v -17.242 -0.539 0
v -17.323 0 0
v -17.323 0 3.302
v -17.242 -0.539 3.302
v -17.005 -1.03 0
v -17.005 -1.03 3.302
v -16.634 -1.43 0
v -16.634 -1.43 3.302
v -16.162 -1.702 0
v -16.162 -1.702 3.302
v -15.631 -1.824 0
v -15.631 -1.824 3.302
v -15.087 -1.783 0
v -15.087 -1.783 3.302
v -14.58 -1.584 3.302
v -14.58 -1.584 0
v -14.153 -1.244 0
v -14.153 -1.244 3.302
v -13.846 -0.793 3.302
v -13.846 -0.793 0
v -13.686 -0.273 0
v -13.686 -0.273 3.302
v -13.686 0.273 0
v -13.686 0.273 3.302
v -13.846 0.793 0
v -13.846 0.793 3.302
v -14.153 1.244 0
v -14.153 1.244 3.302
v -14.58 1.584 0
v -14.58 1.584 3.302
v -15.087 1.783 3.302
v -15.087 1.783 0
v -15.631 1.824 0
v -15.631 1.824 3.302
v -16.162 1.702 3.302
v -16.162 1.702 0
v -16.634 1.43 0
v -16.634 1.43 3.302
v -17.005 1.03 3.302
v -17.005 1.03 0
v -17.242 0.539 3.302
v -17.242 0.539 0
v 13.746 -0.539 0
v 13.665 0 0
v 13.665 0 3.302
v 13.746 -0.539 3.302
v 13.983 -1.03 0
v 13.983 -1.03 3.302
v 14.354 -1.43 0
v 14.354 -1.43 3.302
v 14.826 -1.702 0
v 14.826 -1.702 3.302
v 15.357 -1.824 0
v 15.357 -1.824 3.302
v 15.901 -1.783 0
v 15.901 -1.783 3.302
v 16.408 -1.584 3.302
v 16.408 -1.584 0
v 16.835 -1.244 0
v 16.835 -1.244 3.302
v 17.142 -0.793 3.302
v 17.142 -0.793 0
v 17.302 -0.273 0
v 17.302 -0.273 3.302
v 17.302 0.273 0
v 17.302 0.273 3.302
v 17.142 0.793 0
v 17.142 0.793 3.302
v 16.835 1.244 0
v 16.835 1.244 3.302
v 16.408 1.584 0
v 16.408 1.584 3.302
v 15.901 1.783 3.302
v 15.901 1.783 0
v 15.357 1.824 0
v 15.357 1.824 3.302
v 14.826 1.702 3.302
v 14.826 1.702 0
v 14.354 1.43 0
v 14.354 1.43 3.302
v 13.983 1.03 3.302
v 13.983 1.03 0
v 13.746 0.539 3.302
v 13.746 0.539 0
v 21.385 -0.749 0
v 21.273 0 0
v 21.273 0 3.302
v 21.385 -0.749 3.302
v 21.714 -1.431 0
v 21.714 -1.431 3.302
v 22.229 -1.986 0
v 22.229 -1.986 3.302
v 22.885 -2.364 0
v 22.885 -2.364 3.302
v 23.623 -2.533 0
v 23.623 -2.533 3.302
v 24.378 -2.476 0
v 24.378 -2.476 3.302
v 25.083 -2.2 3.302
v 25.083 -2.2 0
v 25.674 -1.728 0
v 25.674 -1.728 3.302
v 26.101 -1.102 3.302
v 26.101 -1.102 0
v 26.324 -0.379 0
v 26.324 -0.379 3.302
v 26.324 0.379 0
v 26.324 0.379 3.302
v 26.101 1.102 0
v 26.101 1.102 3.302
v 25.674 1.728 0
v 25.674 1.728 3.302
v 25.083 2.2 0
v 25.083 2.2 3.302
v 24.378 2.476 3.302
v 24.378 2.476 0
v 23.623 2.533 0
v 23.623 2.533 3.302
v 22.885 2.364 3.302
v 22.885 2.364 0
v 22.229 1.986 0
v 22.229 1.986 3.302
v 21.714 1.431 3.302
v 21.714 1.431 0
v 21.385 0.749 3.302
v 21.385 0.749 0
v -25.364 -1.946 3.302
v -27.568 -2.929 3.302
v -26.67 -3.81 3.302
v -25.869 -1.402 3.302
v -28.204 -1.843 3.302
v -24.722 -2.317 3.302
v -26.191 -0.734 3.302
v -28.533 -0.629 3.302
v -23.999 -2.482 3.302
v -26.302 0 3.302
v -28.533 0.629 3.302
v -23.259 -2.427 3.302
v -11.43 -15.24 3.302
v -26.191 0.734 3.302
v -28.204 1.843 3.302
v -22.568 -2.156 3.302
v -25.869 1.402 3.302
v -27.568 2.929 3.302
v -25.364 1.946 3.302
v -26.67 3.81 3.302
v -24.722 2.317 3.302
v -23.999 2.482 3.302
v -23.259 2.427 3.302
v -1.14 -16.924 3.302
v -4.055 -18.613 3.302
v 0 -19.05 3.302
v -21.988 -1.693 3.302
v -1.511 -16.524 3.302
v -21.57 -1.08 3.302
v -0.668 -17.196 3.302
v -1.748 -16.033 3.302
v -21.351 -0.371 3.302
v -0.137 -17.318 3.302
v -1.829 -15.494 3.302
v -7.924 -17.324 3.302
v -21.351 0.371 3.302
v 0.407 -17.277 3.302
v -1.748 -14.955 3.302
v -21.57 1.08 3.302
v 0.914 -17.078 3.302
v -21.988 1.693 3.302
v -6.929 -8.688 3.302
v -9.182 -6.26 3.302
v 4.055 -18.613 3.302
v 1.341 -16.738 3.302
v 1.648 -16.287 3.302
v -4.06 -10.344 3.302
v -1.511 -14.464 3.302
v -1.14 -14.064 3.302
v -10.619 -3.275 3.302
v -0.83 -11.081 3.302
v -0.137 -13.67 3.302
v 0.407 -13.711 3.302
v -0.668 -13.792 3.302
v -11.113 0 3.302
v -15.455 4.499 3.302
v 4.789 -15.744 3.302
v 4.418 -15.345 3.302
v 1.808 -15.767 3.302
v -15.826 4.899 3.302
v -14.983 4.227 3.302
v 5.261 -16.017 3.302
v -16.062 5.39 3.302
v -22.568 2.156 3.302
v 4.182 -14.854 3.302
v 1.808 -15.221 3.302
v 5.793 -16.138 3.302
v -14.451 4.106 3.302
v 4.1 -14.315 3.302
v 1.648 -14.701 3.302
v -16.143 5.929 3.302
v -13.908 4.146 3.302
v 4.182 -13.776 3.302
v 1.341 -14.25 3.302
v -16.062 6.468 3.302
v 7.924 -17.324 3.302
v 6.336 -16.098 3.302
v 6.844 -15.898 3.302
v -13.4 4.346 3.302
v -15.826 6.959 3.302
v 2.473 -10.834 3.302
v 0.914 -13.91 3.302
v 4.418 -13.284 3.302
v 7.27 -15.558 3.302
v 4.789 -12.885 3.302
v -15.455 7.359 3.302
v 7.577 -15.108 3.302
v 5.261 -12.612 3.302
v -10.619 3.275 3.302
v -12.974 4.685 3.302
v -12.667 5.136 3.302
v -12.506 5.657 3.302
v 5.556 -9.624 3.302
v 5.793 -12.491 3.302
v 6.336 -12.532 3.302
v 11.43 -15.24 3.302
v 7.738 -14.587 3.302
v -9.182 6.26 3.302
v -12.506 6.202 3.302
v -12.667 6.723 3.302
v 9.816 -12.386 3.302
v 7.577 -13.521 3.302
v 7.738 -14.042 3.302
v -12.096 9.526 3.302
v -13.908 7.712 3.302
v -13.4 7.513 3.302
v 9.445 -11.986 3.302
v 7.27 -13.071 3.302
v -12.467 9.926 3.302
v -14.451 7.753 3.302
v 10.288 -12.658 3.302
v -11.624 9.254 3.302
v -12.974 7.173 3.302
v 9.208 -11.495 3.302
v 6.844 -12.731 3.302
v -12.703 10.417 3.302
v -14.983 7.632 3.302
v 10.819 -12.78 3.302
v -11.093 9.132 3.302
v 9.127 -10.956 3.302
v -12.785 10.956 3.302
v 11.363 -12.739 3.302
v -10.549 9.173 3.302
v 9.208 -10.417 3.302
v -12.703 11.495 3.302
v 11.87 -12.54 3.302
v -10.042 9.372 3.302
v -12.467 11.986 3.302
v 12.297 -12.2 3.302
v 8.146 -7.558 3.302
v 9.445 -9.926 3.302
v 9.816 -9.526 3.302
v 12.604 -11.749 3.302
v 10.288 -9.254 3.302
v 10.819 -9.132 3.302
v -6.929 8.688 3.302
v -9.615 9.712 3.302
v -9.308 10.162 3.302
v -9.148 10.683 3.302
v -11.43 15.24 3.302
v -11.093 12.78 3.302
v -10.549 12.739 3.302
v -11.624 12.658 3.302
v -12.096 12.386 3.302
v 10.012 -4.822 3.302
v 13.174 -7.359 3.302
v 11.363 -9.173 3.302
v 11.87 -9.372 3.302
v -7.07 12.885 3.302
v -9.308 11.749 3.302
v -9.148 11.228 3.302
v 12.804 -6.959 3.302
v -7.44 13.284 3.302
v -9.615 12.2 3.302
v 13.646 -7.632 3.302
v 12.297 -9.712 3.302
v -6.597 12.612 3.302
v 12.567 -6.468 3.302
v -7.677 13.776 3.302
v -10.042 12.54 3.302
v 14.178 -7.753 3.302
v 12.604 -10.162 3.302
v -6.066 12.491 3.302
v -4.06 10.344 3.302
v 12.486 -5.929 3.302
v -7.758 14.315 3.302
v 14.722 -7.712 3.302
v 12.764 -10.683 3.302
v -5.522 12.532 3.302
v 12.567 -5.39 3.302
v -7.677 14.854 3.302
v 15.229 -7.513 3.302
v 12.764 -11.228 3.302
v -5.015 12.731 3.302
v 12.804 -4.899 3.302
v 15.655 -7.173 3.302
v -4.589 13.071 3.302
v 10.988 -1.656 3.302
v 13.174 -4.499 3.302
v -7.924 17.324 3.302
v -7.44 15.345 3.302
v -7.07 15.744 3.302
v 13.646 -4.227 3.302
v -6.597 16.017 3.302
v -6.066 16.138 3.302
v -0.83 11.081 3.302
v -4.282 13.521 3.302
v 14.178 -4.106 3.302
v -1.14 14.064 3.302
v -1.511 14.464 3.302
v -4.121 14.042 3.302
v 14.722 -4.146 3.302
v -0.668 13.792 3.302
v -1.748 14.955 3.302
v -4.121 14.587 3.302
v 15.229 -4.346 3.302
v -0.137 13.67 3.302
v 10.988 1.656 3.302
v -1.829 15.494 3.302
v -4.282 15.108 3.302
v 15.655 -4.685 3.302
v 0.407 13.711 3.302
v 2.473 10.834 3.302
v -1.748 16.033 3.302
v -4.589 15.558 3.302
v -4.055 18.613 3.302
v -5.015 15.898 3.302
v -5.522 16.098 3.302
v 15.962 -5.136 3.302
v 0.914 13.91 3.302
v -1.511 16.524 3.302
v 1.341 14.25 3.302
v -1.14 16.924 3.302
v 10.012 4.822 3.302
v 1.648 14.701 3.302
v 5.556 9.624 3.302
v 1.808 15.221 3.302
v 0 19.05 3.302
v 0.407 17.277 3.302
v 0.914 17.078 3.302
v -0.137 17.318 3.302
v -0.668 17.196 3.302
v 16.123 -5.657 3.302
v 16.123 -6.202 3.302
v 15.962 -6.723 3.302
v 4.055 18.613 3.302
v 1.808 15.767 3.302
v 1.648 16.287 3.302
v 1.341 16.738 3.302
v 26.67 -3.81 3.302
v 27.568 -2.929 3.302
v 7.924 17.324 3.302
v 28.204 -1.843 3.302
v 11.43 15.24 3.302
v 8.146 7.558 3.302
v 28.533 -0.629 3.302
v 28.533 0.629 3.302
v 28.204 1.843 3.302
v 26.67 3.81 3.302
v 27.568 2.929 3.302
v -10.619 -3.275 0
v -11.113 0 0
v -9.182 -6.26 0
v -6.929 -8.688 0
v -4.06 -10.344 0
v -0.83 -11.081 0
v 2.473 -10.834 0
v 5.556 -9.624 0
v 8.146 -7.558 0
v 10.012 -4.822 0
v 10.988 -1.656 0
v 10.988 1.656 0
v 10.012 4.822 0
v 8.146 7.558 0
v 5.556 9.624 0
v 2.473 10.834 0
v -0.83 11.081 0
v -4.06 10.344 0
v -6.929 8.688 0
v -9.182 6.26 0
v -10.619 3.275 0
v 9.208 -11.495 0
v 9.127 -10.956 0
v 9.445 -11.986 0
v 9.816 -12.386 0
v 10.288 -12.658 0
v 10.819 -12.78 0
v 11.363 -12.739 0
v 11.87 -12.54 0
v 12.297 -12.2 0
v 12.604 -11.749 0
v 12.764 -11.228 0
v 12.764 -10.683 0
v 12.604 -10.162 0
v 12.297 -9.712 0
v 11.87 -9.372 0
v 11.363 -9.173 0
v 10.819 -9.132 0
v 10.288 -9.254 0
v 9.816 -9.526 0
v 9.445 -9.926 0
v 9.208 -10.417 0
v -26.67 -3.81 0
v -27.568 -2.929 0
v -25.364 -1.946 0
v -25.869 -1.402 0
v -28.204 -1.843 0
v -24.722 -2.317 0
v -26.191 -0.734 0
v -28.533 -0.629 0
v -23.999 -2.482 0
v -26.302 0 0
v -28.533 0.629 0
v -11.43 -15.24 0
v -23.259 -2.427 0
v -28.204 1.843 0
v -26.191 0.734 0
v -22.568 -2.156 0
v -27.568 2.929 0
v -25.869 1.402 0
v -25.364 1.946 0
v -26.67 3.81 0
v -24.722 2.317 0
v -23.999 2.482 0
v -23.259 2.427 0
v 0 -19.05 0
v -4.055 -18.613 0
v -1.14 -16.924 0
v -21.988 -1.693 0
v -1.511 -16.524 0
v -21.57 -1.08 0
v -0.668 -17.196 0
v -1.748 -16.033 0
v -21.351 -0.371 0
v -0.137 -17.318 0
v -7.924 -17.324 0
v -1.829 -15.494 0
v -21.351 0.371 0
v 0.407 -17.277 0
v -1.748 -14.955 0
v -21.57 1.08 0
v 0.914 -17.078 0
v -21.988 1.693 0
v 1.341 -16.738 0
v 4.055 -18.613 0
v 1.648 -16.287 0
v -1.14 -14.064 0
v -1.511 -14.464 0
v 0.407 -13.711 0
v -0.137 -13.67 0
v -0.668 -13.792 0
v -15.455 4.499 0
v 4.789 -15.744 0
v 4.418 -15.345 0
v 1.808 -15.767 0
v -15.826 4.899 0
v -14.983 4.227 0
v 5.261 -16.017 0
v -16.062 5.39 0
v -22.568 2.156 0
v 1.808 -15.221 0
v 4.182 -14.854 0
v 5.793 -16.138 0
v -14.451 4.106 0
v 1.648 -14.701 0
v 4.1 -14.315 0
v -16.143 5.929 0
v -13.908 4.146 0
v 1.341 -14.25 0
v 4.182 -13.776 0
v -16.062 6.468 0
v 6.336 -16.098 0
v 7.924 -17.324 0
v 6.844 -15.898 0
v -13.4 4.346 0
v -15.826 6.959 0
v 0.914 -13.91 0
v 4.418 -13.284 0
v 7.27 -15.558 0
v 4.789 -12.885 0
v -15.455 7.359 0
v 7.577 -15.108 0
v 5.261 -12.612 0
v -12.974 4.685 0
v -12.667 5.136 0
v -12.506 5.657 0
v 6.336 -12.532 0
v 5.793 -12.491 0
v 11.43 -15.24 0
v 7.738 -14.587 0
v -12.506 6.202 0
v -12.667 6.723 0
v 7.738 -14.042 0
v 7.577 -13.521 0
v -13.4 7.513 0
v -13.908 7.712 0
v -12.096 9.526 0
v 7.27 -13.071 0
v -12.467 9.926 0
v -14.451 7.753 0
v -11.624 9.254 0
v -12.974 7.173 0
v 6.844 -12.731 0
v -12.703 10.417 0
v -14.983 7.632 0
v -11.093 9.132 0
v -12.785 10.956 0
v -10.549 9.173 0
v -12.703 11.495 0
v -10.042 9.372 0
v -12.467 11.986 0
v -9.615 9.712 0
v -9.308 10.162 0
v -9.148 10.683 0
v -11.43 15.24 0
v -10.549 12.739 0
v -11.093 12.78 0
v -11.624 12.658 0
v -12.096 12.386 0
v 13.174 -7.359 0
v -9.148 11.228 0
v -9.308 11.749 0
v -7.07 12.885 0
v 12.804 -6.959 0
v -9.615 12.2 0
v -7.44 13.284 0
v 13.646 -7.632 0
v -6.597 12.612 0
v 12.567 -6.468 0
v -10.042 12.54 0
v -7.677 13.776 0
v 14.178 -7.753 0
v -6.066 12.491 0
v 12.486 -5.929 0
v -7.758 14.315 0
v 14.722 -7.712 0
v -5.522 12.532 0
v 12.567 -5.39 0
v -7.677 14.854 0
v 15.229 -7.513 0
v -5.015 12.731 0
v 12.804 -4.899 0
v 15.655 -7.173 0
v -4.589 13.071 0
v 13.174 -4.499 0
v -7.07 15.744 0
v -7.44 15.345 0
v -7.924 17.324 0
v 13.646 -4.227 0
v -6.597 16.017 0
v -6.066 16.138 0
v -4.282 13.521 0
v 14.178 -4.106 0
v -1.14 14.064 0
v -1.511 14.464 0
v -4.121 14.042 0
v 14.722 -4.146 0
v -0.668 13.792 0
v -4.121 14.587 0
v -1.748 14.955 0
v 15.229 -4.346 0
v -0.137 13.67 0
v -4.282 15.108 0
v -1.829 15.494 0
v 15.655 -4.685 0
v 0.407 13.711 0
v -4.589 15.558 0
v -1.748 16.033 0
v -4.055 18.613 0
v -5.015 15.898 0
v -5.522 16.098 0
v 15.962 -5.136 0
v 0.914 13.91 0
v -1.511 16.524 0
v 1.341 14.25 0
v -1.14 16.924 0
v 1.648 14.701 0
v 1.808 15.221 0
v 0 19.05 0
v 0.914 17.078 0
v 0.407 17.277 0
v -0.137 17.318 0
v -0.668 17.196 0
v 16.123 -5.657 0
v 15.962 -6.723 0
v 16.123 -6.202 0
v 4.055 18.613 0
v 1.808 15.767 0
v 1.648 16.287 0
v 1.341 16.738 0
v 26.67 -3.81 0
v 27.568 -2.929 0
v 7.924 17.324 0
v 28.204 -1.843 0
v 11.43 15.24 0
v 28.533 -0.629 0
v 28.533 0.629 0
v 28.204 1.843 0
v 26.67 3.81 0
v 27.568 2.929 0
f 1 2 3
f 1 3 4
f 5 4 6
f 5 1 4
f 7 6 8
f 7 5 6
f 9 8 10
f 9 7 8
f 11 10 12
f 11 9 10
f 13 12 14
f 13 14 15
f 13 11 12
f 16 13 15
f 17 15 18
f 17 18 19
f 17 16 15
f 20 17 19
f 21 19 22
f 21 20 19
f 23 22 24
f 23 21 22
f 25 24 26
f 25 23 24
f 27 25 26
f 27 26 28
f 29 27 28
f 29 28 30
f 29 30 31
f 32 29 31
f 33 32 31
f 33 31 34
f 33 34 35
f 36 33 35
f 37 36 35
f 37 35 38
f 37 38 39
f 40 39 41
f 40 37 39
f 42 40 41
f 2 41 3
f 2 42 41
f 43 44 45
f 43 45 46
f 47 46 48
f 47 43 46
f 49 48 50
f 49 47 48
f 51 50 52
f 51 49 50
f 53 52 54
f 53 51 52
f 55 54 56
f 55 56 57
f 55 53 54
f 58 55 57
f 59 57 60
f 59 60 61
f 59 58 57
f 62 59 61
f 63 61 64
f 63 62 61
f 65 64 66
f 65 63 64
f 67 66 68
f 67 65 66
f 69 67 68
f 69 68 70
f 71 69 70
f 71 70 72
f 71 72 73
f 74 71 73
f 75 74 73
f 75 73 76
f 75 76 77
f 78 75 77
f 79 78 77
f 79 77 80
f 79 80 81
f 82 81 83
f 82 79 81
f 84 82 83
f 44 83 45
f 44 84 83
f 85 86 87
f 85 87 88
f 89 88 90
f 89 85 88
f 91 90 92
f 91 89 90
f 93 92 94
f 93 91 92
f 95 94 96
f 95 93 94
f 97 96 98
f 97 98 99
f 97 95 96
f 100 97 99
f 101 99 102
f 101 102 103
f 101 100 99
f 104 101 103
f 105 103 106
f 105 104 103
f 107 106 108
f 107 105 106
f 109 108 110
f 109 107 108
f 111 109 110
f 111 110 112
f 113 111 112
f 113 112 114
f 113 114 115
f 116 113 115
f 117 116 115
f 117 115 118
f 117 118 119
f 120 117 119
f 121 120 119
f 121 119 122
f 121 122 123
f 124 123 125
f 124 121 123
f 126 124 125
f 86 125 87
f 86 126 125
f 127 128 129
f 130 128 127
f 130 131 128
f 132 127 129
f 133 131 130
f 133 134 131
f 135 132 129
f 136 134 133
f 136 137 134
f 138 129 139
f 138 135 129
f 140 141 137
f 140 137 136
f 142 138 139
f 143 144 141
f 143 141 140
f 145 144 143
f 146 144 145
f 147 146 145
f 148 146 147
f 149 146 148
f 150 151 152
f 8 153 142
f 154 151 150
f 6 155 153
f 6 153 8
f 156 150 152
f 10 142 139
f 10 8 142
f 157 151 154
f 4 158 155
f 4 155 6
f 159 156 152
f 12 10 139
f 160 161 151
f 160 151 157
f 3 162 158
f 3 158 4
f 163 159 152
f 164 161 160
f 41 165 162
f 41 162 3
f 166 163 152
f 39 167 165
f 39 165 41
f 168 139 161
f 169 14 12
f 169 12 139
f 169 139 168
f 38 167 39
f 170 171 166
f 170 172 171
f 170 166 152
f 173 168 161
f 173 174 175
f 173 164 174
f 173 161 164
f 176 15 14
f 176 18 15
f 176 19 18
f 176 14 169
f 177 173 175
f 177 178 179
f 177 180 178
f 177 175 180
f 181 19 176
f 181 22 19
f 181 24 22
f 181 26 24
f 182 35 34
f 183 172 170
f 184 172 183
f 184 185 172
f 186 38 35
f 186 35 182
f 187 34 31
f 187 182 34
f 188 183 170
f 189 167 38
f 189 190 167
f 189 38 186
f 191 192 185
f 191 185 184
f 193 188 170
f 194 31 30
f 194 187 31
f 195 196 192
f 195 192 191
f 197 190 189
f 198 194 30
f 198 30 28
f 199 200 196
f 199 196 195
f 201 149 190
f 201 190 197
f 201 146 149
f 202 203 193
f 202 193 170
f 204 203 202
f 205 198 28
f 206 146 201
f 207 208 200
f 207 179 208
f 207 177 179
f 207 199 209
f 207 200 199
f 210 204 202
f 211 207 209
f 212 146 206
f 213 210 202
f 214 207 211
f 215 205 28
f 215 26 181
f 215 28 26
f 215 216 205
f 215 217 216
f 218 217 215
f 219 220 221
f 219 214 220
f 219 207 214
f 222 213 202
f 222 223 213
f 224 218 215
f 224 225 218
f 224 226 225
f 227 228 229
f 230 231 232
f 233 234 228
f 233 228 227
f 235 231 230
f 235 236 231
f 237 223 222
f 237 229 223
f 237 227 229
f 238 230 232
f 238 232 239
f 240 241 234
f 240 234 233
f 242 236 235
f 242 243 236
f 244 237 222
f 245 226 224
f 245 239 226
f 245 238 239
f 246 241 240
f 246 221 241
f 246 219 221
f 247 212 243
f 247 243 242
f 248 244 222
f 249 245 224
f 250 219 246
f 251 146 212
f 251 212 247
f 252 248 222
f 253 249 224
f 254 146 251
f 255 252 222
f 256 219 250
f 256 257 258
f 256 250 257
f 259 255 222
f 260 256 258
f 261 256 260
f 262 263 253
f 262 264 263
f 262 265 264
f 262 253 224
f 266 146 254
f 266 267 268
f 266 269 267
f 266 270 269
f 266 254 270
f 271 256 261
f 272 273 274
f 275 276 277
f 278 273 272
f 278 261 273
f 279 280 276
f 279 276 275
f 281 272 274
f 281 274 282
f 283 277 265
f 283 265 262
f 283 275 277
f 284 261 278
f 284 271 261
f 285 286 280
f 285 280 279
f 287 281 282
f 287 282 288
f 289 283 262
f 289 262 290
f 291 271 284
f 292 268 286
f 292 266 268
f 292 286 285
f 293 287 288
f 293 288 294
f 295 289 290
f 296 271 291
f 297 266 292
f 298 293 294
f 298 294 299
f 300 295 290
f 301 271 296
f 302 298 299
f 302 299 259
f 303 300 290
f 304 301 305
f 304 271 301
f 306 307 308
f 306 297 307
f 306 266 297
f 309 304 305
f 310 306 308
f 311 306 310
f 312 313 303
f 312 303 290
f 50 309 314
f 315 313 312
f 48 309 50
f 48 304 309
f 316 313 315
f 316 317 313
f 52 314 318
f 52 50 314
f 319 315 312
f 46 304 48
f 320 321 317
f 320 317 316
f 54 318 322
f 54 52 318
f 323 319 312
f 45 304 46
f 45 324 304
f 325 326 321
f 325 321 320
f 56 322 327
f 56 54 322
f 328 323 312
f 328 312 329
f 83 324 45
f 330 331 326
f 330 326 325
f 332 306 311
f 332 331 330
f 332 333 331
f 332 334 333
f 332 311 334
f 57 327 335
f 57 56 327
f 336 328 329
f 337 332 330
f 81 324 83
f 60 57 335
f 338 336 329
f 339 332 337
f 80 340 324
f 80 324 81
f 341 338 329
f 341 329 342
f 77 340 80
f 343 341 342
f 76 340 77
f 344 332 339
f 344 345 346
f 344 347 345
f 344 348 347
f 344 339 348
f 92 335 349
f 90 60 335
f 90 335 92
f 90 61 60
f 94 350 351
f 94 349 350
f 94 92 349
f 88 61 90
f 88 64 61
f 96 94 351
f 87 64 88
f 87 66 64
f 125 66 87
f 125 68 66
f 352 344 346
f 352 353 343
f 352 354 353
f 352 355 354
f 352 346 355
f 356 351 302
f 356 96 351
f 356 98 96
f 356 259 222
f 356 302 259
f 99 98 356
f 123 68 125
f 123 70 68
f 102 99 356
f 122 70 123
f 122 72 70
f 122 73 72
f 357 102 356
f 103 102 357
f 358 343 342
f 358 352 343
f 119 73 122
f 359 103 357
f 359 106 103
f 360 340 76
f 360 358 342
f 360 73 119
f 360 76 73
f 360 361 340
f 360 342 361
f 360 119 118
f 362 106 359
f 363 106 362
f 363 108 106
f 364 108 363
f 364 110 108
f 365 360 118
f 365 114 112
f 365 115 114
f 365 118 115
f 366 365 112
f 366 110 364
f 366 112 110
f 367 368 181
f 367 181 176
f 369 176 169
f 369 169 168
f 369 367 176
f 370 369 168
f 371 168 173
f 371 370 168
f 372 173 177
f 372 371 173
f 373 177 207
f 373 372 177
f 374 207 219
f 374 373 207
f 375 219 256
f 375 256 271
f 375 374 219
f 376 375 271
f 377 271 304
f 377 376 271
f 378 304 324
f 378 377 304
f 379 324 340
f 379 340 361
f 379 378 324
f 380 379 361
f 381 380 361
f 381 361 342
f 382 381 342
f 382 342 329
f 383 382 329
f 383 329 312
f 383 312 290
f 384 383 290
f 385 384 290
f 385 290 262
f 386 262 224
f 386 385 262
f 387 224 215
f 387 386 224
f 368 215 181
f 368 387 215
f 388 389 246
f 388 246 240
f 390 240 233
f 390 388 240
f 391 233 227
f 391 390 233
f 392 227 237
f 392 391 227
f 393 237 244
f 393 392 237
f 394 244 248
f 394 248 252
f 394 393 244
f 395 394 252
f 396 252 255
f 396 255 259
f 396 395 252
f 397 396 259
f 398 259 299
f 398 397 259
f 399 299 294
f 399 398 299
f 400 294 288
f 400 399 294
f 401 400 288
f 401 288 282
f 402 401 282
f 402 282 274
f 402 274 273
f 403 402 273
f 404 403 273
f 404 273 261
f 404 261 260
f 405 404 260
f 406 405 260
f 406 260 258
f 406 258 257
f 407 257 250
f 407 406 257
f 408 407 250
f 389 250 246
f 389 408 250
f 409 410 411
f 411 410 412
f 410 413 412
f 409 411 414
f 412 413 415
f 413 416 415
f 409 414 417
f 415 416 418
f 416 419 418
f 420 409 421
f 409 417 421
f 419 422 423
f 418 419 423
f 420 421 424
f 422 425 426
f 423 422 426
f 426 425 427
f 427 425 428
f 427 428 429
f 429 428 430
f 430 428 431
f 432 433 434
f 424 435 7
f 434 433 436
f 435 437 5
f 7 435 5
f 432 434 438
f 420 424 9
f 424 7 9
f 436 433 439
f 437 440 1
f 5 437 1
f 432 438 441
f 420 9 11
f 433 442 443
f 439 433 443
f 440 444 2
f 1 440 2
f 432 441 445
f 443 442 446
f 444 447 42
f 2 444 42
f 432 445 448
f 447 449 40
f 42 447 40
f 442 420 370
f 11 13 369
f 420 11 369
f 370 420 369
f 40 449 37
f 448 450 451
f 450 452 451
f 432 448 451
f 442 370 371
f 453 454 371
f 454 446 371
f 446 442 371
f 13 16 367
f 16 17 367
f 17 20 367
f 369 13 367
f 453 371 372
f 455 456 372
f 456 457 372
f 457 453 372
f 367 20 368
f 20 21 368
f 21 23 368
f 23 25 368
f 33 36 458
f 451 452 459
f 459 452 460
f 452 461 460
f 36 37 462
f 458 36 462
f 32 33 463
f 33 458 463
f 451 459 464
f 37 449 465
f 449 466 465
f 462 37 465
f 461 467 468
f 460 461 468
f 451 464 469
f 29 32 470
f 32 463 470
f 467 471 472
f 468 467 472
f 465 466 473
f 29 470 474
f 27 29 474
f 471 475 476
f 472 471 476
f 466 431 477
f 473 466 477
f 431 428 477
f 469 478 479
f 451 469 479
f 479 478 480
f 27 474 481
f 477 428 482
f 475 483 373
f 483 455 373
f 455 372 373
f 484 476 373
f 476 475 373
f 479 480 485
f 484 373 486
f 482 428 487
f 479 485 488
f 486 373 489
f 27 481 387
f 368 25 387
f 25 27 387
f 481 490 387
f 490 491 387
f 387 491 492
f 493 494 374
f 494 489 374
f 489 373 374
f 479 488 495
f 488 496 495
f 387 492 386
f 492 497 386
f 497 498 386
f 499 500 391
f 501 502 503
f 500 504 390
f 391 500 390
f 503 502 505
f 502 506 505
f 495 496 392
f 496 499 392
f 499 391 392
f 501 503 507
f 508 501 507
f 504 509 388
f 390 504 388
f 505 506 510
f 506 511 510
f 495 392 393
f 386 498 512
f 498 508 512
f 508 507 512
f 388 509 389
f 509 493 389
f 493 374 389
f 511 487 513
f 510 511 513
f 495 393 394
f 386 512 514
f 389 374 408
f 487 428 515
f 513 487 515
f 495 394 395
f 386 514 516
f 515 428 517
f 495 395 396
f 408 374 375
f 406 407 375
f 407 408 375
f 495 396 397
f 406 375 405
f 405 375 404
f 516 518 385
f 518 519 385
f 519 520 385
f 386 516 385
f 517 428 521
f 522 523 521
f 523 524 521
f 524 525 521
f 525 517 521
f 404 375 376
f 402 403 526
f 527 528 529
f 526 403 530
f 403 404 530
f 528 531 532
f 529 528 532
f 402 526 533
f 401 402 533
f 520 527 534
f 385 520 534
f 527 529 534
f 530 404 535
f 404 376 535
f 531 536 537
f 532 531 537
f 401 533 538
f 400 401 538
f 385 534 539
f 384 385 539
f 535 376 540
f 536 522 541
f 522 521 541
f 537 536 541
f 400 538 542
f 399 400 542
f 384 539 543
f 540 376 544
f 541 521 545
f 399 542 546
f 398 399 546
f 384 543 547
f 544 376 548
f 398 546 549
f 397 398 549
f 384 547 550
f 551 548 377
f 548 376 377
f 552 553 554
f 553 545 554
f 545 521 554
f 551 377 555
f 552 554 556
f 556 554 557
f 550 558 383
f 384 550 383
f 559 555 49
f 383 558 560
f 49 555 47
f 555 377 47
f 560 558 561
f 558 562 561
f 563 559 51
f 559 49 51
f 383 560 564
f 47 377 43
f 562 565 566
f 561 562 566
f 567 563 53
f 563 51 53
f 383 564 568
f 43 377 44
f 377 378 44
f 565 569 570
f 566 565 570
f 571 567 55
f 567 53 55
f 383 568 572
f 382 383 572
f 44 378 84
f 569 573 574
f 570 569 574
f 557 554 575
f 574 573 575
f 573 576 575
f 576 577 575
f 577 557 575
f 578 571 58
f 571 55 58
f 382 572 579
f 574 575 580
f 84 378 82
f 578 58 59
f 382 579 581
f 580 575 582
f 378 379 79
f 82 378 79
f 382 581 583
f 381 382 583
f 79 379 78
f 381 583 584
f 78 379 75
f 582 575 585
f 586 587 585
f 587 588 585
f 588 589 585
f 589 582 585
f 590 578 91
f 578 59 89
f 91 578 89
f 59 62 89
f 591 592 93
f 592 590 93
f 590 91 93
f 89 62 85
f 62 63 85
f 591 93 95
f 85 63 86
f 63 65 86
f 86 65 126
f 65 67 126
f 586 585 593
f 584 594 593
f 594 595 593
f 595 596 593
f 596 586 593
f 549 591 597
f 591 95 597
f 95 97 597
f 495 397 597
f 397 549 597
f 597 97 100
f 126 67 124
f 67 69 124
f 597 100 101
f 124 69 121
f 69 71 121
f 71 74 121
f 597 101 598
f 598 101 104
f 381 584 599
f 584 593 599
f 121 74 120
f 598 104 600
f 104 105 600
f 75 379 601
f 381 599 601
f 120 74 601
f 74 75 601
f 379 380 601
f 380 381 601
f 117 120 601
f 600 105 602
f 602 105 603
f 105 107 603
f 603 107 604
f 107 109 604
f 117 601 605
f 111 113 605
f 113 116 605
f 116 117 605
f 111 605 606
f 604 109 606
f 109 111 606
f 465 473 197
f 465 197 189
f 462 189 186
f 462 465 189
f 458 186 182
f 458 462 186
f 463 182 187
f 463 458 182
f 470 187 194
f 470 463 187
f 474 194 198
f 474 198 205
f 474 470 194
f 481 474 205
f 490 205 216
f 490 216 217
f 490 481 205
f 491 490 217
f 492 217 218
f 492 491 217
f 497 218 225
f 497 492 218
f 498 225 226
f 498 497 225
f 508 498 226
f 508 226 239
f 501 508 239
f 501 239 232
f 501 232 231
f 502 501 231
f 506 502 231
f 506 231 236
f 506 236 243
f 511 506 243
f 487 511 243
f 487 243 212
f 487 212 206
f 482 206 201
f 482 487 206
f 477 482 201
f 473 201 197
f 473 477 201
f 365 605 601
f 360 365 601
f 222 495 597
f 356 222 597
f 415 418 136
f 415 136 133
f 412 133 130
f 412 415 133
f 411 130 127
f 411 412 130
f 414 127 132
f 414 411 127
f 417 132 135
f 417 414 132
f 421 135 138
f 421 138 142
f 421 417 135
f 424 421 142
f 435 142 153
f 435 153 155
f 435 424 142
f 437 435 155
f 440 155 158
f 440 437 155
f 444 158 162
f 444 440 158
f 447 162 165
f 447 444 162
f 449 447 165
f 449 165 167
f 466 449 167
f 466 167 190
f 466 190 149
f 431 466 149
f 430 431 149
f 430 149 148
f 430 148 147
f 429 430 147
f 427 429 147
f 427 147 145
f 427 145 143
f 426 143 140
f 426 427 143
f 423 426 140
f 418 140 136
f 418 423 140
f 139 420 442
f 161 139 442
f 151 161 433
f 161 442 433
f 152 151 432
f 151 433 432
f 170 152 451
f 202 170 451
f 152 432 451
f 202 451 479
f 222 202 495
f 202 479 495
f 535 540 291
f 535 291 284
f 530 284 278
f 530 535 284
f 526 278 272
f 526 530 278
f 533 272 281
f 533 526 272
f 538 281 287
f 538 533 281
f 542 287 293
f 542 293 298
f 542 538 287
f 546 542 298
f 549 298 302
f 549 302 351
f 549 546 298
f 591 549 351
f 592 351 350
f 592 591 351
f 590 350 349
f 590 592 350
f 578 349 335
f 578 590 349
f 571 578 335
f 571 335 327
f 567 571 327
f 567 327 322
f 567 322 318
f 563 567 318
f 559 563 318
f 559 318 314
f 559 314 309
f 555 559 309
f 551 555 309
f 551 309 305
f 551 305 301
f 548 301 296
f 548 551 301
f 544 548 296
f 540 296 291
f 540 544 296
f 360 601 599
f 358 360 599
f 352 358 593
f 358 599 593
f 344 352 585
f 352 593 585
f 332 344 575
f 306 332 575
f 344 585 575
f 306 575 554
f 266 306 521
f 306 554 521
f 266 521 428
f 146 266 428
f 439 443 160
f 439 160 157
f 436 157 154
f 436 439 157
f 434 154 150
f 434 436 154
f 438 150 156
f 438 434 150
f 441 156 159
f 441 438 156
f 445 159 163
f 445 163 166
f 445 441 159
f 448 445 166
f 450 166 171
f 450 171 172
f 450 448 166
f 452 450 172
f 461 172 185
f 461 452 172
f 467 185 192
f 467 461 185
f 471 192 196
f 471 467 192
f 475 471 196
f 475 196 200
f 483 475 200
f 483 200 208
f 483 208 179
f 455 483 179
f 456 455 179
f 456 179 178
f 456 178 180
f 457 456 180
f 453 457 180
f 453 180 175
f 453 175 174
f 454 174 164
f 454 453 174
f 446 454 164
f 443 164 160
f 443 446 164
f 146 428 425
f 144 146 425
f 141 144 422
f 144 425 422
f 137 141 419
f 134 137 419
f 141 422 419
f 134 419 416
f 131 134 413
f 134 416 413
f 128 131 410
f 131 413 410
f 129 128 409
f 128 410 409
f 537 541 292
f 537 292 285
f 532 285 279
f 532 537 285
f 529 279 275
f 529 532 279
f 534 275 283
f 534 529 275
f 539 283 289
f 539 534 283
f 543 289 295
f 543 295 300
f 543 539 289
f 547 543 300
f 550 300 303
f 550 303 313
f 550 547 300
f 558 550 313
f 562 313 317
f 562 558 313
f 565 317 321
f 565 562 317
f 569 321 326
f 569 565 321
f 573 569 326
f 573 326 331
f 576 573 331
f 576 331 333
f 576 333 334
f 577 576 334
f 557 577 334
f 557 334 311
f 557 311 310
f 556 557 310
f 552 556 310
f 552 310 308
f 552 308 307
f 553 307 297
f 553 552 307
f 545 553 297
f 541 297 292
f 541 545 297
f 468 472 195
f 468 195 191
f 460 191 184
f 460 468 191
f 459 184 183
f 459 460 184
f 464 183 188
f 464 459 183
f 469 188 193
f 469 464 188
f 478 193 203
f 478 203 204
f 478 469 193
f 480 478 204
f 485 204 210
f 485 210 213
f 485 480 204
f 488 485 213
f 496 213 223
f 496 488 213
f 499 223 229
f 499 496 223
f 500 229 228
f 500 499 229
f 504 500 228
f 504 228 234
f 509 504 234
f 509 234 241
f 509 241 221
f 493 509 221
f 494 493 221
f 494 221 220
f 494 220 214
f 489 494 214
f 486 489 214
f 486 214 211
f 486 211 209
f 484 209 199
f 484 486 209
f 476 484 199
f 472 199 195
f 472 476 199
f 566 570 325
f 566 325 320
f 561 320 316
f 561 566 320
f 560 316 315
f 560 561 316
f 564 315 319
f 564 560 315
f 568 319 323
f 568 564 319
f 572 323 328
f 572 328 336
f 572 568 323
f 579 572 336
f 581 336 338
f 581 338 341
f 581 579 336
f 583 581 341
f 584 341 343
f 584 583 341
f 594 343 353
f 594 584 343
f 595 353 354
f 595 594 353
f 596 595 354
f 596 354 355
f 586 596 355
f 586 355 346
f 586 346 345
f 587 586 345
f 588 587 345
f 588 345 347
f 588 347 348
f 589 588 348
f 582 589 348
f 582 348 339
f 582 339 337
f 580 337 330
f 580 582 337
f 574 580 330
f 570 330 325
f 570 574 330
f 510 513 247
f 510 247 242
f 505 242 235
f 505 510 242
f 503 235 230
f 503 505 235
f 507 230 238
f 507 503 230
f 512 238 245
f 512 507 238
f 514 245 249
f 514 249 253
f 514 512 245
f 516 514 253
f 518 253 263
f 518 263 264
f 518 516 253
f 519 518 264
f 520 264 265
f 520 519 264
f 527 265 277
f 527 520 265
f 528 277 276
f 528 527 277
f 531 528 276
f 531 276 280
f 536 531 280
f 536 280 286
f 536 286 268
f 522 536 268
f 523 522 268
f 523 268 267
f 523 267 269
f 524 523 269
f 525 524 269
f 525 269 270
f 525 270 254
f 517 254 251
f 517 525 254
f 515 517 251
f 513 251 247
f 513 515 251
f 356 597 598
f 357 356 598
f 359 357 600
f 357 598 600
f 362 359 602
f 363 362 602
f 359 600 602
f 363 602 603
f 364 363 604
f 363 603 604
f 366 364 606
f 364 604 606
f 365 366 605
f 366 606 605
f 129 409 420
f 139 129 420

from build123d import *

# Parameters (mm, degrees)
SKETCH1_R           = 11.112500335
SKETCH1_R_2         = 1.828800055
SKETCH1_R_3         = 2.489200075
SKETCH1_R_4         = 2.540000076
BOSS_EXTRUDE1_DEPTH = 3.302


with BuildPart() as part:
    # Sketch1 → Boss-Extrude1 (new body)
    with BuildSketch(Plane.XY):
        with BuildLine():
            Line((-26.670000803, -3.810000115), (-11.430000344, -15.240000459))
            ThreePointArc((-11.430000344, -15.240000459), (0, -19.050000574), (11.430000344, -15.240000459))
            Line((11.430000344, -15.240000459), (26.670000803, -3.810000115))
            ThreePointArc((26.670000803, -3.810000115), (28.57500086, 0), (26.670000803, 3.810000115))
            Line((26.670000803, 3.810000115), (11.430000344, 15.240000459))
            ThreePointArc((11.430000344, 15.240000459), (0, 19.050000574), (-11.430000344, 15.240000459))
            Line((-11.430000344, 15.240000459), (-26.670000803, 3.810000115))
            ThreePointArc((-26.670000803, 3.810000115), (-28.57500086, 0), (-26.670000803, -3.810000115))
        make_face()
        with Locations(Location((0, 0, 0), (0, 0, 180))):
            Circle(SKETCH1_R, mode=Mode.SUBTRACT)
        with Locations(Location((0, 15.494000466, 0), (0, 0, 180))):
            Circle(SKETCH1_R_2, mode=Mode.SUBTRACT)
        with Locations(Location((-15.494000466, 0, 0), (0, 0, 180))):
            Circle(SKETCH1_R_2, mode=Mode.SUBTRACT)
        with Locations(Location((-14.314589908, 5.92929728, 0), (0, 0, 180))):
            Circle(SKETCH1_R_2, mode=Mode.SUBTRACT)
        with Locations(Location((-5.92929728, 14.314589908, 0), (0, 0, 180))):
            Circle(SKETCH1_R_2, mode=Mode.SUBTRACT)
        with Locations(Location((-10.955912798, 10.955912798, 0), (0, 0, 180))):
            Circle(SKETCH1_R_2, mode=Mode.SUBTRACT)
        with Locations(Location((0, -15.494000466, 0), (0, 0, 180))):
            Circle(SKETCH1_R_2, mode=Mode.SUBTRACT)
        with Locations(Location((15.494000466, 0, 0), (0, 0, 180))):
            Circle(SKETCH1_R_2, mode=Mode.SUBTRACT)
        with Locations(Location((14.314589908, -5.92929728, 0), (0, 0, 180))):
            Circle(SKETCH1_R_2, mode=Mode.SUBTRACT)
        with Locations(Location((5.92929728, -14.314589908, 0), (0, 0, 180))):
            Circle(SKETCH1_R_2, mode=Mode.SUBTRACT)
        with Locations(Location((10.955912798, -10.955912798, 0), (0, 0, 180))):
            Circle(SKETCH1_R_2, mode=Mode.SUBTRACT)
        with Locations(Location((-23.812500717, 0, 0), (0, 0, 180))):
            Circle(SKETCH1_R_3, mode=Mode.SUBTRACT)
        with Locations(Location((23.812500717, 0, 0), (0, 0, 180))):
            Circle(SKETCH1_R_4, mode=Mode.SUBTRACT)
    extrude(amount=BOSS_EXTRUDE1_DEPTH)


solid = part.part
